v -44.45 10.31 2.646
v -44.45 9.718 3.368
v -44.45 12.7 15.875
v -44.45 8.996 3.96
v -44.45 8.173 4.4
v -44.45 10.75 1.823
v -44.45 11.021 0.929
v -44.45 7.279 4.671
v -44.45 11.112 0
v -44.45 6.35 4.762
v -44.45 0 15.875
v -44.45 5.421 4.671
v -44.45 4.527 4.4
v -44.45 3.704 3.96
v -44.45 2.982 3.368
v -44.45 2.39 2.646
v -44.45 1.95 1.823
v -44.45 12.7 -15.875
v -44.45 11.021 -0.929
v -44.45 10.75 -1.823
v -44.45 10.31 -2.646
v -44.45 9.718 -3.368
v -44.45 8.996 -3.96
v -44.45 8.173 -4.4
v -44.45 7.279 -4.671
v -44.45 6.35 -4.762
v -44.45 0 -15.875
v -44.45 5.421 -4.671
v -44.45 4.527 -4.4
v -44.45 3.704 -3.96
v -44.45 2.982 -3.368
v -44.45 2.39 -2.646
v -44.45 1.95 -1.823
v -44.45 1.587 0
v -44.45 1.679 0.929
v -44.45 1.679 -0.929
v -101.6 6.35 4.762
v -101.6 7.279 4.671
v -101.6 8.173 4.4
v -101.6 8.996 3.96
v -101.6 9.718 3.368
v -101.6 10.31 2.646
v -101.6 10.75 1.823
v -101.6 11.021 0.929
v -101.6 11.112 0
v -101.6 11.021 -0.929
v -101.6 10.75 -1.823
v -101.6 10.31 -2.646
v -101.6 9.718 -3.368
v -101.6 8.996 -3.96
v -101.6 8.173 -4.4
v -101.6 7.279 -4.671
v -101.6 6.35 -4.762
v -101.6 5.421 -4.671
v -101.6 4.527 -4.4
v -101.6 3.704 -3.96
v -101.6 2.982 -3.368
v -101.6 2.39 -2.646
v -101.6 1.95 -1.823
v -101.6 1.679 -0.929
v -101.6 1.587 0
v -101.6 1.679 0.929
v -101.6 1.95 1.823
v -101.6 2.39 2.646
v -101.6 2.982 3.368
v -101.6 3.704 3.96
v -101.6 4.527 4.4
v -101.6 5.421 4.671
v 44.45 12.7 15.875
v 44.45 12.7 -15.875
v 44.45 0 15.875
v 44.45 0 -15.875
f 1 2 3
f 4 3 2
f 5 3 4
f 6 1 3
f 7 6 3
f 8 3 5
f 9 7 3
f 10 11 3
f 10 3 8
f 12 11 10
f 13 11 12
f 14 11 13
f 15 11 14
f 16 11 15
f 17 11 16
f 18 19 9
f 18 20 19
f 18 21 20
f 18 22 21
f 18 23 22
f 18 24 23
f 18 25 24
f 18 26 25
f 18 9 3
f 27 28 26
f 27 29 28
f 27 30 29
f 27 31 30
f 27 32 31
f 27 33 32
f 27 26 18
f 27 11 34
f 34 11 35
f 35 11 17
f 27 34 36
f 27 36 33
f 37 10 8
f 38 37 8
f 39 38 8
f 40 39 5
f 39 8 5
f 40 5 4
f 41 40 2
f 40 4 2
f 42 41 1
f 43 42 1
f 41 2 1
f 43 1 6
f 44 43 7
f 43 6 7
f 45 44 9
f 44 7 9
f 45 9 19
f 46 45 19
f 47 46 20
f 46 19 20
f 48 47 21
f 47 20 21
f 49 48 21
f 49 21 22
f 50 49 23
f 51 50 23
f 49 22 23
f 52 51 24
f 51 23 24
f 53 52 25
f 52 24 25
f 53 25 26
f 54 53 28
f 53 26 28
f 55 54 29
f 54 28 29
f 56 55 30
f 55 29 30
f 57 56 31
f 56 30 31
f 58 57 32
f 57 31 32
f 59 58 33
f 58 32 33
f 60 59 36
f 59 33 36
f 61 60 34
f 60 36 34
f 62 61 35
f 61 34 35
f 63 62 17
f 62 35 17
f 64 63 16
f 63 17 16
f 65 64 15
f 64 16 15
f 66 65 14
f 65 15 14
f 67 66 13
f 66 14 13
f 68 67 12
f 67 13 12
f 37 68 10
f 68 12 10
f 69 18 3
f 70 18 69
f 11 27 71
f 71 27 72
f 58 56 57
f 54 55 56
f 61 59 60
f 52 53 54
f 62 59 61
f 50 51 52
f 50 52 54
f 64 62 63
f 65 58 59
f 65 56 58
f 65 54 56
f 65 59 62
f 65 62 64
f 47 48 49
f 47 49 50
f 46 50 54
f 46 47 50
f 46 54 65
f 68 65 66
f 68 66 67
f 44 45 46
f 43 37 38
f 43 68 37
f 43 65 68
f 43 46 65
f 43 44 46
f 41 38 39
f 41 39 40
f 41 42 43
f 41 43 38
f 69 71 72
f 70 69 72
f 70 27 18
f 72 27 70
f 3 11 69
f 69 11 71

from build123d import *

# Parameters (mm, degrees)
SKETCH1_W           = 88.9
SKETCH1_H           = 31.75
BOSS_EXTRUDE1_DEPTH = 12.7
SKETCH2_R           = 4.7625
BOSS_EXTRUDE2_DEPTH = 57.15


with BuildPart() as part:
    # Sketch1 → Boss-Extrude1 (new body)
    with BuildSketch(Plane(origin=(0, 0, 0), x_dir=(1, 0, 0), z_dir=(0, 1, 0))):
        Rectangle(SKETCH1_W, SKETCH1_H)
    extrude(amount=BOSS_EXTRUDE1_DEPTH)

    # Sketch2 → Boss-Extrude2 (add)
    with BuildSketch(Plane.ZY.offset(44.45)):
        with Locations((0, 6.35)):
            Circle(SKETCH2_R)
    extrude(amount=BOSS_EXTRUDE2_DEPTH)


solid = part.part
